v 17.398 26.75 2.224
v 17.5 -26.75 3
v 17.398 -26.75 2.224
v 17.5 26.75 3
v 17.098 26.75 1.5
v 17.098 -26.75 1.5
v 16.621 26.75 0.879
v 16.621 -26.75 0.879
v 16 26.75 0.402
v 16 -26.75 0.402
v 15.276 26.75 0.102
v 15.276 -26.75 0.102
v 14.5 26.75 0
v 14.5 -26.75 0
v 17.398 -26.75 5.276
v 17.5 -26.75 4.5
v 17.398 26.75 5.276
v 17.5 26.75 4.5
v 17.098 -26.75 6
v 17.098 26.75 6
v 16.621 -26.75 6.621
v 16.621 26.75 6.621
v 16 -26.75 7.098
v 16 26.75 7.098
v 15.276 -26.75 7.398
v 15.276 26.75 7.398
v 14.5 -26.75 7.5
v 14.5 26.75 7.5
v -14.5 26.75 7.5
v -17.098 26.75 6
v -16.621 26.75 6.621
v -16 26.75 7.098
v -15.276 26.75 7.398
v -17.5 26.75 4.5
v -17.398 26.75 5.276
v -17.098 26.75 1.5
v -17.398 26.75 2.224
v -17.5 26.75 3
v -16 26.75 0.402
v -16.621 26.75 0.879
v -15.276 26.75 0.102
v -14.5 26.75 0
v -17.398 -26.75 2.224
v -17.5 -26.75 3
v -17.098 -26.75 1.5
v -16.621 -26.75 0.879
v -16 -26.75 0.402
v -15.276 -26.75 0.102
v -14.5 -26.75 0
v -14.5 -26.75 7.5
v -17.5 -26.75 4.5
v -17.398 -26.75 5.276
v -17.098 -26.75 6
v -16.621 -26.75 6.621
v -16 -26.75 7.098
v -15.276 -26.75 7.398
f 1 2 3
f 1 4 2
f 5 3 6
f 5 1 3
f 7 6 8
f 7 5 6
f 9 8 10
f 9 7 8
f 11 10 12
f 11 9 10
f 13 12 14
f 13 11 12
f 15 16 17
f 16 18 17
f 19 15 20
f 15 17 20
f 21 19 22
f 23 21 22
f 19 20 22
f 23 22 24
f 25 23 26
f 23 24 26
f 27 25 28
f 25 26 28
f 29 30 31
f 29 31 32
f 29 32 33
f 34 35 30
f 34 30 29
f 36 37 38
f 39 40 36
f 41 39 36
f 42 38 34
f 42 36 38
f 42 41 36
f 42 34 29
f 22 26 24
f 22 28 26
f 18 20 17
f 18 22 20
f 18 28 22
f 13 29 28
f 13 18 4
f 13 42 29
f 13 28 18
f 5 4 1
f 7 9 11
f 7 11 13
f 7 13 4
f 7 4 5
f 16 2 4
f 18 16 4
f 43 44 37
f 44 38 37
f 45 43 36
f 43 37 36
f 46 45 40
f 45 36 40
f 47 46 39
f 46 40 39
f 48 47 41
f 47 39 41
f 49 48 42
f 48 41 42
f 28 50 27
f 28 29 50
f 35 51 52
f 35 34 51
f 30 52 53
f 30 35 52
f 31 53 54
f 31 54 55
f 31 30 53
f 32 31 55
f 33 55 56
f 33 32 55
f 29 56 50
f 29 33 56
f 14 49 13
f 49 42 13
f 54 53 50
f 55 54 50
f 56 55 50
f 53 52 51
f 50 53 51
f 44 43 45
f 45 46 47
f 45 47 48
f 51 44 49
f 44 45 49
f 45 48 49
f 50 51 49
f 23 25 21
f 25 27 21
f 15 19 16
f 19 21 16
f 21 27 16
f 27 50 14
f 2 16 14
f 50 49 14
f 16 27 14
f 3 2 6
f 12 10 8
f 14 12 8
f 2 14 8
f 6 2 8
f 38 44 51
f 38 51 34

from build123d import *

# Parameters (mm, degrees)
CROQUIS1_W              = 35
CROQUIS1_H              = 53.5
SALIENTE_EXTRUIR1_DEPTH = 7.5
REDONDEO1_R             = 3


with BuildPart() as part:
    # Croquis1 → Saliente-Extruir1 (new body)
    with BuildSketch(Plane.XY):
        Rectangle(CROQUIS1_W, CROQUIS1_H)
    extrude(amount=SALIENTE_EXTRUIR1_DEPTH)

    # Redondeo1
    redondeo1_edges = [part.edges().sort_by_distance(p)[0] for p in [
        (17.5, 0, 7.5),
        (-17.5, 0, 7.5),
        (17.5, 0, 0),
        (-17.5, 0, 0),
    ]]
    fillet(redondeo1_edges, radius=REDONDEO1_R)


solid = part.part
